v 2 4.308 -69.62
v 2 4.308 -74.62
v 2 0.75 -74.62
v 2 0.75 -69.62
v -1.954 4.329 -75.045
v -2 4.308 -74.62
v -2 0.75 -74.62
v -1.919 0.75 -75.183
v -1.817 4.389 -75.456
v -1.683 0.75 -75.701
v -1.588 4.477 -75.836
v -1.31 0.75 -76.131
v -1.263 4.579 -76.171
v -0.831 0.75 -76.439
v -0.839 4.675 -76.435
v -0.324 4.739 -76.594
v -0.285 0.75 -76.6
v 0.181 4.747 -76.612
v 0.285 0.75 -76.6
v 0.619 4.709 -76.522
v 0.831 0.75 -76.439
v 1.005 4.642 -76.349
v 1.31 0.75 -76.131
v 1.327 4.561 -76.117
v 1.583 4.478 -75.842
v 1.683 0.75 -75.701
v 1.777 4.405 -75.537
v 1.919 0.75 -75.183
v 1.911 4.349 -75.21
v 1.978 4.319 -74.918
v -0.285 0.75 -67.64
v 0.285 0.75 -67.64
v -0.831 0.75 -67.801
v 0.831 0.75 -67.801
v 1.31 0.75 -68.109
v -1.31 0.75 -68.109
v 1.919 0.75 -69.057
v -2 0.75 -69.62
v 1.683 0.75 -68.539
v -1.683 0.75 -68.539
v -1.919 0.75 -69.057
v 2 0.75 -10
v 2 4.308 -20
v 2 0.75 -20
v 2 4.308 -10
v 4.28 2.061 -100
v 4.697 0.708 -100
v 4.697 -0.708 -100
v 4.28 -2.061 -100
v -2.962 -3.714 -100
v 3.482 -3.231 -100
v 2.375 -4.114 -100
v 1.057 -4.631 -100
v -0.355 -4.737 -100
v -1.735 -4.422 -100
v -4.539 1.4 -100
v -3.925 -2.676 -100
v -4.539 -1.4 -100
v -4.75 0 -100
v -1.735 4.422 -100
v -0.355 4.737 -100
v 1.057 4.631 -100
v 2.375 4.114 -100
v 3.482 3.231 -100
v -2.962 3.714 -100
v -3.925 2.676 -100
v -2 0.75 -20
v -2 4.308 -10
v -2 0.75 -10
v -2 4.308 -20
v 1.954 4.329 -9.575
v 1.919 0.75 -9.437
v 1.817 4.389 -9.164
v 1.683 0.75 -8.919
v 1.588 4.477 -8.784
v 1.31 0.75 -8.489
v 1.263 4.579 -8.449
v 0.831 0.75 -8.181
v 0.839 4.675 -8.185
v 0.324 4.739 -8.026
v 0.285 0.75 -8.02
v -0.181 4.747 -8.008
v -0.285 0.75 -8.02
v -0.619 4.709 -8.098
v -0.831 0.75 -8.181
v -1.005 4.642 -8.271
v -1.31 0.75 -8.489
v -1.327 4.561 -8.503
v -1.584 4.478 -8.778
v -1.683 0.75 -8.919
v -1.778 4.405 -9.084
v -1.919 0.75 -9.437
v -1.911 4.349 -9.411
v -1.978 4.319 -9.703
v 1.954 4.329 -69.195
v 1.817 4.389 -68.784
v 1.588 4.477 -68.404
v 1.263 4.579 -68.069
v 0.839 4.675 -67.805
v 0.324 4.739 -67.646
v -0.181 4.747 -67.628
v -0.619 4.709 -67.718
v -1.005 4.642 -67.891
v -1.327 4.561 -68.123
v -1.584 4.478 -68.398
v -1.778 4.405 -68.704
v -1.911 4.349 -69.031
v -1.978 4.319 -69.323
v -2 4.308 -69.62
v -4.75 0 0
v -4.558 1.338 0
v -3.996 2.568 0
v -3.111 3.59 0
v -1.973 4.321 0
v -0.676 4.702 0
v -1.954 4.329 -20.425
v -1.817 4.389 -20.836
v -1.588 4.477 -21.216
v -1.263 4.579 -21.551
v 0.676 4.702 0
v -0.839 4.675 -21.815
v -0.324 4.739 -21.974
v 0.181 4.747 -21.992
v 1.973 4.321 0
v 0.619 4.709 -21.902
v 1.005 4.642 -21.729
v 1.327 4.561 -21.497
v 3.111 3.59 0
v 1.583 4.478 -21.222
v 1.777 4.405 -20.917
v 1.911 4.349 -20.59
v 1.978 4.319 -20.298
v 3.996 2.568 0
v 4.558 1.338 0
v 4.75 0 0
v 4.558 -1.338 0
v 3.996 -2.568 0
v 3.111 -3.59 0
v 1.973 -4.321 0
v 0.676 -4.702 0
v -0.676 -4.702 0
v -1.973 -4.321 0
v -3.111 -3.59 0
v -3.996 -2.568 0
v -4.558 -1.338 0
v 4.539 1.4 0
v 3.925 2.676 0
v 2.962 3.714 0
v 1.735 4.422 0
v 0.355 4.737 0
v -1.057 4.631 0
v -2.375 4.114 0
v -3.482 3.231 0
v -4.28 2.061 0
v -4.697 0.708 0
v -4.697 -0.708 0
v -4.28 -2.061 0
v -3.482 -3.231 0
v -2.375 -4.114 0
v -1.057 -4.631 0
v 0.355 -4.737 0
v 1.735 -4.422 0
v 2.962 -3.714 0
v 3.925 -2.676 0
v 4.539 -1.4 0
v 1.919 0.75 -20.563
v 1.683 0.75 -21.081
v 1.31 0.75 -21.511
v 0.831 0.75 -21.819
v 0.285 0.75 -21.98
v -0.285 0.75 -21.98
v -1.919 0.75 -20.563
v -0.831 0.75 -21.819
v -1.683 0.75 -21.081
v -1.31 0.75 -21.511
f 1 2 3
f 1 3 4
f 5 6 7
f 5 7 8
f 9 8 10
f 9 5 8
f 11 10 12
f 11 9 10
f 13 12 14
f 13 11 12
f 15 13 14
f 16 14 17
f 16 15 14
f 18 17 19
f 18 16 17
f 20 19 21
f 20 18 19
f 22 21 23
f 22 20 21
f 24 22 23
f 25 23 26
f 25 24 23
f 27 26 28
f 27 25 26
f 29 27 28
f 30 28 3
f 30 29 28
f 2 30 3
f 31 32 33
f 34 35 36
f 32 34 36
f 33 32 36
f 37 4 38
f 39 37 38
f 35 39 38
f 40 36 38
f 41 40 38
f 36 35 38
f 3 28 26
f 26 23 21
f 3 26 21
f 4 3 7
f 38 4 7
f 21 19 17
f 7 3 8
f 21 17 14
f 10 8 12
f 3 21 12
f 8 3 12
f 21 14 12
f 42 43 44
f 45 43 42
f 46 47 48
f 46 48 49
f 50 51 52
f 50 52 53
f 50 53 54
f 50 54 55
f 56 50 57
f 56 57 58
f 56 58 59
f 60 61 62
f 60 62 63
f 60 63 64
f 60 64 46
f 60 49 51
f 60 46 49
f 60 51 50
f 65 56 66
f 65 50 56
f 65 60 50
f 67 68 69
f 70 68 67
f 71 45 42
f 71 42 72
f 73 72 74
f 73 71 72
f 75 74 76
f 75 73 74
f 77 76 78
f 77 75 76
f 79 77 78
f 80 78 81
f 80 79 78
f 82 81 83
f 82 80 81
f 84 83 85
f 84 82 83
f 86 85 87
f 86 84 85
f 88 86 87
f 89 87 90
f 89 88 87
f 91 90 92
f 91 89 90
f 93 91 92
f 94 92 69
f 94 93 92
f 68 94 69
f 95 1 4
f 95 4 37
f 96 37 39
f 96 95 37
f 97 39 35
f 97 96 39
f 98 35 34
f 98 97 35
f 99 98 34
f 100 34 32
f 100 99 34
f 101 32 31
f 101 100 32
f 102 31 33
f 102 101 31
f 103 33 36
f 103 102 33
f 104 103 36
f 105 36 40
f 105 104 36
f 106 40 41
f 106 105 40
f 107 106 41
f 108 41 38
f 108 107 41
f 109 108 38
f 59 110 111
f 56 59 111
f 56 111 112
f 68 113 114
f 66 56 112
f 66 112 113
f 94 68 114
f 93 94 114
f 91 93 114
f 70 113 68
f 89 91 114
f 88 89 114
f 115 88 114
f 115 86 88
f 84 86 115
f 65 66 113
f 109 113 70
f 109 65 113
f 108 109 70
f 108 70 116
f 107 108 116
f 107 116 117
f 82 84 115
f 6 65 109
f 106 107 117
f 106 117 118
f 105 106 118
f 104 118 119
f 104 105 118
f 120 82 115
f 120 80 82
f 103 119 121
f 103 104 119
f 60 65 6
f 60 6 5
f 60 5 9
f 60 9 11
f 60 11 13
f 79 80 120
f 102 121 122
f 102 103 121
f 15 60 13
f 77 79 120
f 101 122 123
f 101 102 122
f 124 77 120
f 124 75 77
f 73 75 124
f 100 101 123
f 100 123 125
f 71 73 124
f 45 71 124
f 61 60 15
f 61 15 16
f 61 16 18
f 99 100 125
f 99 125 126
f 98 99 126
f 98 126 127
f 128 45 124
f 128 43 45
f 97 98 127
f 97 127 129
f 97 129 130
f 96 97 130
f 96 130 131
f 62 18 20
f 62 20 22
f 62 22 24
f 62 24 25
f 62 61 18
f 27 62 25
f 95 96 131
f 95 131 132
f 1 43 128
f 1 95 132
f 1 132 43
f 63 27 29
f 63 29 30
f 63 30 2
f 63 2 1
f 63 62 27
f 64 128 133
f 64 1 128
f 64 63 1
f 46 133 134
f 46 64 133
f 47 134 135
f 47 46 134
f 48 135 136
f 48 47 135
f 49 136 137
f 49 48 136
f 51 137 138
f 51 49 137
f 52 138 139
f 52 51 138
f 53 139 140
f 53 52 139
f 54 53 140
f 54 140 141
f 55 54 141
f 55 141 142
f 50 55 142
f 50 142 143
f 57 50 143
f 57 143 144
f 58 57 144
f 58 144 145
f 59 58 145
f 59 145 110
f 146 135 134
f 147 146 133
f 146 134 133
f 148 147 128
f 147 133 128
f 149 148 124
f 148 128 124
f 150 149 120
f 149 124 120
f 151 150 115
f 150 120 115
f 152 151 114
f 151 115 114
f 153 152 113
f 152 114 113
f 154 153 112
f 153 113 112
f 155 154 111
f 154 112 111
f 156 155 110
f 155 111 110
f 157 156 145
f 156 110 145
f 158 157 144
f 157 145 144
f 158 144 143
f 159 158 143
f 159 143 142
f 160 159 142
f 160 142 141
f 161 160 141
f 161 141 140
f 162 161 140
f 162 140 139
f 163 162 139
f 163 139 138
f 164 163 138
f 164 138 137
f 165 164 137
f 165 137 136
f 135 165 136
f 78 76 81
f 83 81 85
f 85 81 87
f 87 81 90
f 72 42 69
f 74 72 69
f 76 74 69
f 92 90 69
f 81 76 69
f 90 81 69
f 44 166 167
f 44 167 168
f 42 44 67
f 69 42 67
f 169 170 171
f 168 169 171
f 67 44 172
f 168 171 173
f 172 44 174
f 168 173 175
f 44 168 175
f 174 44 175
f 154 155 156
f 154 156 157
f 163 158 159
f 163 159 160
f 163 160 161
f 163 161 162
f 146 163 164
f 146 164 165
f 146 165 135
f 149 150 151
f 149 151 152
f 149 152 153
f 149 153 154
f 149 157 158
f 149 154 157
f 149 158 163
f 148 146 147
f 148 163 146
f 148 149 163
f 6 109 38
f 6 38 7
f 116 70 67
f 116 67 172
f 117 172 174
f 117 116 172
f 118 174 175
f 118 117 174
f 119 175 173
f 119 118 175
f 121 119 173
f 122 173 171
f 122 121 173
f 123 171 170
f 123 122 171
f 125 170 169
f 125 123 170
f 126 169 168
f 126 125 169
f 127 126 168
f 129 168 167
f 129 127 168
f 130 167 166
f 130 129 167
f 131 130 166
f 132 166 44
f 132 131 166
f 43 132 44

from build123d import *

# Parameters (mm, degrees)
SKETCH1_R           = 4.75
BOSS_EXTRUDE1_DEPTH = 0.0001
BOSS_EXTRUDE2_START = 105
SKETCH4_R           = 4.75
BOSS_EXTRUDE2_DEPTH = 105
CUT_EXTRUDE3_DEPTH  = 4
SKETCH6_R           = 4.75
CUT_EXTRUDE4_DEPTH  = 5


with BuildPart() as part:
    # Sketch1 → Boss-Extrude1 (new body)
    with BuildSketch(Plane.XY):
        Circle(SKETCH1_R)
    extrude(amount=BOSS_EXTRUDE1_DEPTH)

    # Sketch4 → Boss-Extrude2 (add)
    with BuildSketch(Plane(origin=(0, 0, 0), x_dir=(-1, 0, 0), z_dir=(0, 0, -1)).offset(BOSS_EXTRUDE2_START)):
        Circle(SKETCH4_R)
    extrude(amount=-BOSS_EXTRUDE2_DEPTH)

    # Sketch5 → Cut-Extrude3 (cut)
    with BuildSketch(Plane(origin=(0, 4.75, 0), x_dir=(1, 0, 0), z_dir=(0, 1, 0))):
        with BuildLine():
            Line((-2, 10), (-2, 20))
            ThreePointArc((-2, 20), (0, 22), (2, 20))
            Line((2, 20), (2, 10))
            ThreePointArc((2, 10), (0, 8), (-2, 10))
        make_face()
        with BuildLine():
            Line((-2, 69.62), (-2, 74.62))
            ThreePointArc((-2, 74.62), (0, 76.62), (2, 74.62))
            Line((2, 74.62), (2, 69.62))
            ThreePointArc((2, 69.62), (0, 67.62), (-2, 69.62))
        make_face()
    extrude(amount=-CUT_EXTRUDE3_DEPTH, mode=Mode.SUBTRACT)

    # Sketch6 → Cut-Extrude4 (cut)
    with BuildSketch(Plane(origin=(0, 0, -105), x_dir=(-1, 0, 0), z_dir=(0, 0, -1))):
        Circle(SKETCH6_R)
    extrude(amount=-CUT_EXTRUDE4_DEPTH, mode=Mode.SUBTRACT)


solid = part.part
